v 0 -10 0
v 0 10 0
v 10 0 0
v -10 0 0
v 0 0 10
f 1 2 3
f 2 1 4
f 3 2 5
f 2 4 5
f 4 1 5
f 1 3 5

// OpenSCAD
//created with rubyscad 1.0

polyhedron(points = [[10, 0, 0], [0, 10, 0], [-10, 0, 0], [0, -10, 0], [0, 0, 10]], triangles = [[0, 1, 2, 3], [4, 1, 0], [4, 2, 1], [4, 3, 2], [4, 0, 3]]); 
